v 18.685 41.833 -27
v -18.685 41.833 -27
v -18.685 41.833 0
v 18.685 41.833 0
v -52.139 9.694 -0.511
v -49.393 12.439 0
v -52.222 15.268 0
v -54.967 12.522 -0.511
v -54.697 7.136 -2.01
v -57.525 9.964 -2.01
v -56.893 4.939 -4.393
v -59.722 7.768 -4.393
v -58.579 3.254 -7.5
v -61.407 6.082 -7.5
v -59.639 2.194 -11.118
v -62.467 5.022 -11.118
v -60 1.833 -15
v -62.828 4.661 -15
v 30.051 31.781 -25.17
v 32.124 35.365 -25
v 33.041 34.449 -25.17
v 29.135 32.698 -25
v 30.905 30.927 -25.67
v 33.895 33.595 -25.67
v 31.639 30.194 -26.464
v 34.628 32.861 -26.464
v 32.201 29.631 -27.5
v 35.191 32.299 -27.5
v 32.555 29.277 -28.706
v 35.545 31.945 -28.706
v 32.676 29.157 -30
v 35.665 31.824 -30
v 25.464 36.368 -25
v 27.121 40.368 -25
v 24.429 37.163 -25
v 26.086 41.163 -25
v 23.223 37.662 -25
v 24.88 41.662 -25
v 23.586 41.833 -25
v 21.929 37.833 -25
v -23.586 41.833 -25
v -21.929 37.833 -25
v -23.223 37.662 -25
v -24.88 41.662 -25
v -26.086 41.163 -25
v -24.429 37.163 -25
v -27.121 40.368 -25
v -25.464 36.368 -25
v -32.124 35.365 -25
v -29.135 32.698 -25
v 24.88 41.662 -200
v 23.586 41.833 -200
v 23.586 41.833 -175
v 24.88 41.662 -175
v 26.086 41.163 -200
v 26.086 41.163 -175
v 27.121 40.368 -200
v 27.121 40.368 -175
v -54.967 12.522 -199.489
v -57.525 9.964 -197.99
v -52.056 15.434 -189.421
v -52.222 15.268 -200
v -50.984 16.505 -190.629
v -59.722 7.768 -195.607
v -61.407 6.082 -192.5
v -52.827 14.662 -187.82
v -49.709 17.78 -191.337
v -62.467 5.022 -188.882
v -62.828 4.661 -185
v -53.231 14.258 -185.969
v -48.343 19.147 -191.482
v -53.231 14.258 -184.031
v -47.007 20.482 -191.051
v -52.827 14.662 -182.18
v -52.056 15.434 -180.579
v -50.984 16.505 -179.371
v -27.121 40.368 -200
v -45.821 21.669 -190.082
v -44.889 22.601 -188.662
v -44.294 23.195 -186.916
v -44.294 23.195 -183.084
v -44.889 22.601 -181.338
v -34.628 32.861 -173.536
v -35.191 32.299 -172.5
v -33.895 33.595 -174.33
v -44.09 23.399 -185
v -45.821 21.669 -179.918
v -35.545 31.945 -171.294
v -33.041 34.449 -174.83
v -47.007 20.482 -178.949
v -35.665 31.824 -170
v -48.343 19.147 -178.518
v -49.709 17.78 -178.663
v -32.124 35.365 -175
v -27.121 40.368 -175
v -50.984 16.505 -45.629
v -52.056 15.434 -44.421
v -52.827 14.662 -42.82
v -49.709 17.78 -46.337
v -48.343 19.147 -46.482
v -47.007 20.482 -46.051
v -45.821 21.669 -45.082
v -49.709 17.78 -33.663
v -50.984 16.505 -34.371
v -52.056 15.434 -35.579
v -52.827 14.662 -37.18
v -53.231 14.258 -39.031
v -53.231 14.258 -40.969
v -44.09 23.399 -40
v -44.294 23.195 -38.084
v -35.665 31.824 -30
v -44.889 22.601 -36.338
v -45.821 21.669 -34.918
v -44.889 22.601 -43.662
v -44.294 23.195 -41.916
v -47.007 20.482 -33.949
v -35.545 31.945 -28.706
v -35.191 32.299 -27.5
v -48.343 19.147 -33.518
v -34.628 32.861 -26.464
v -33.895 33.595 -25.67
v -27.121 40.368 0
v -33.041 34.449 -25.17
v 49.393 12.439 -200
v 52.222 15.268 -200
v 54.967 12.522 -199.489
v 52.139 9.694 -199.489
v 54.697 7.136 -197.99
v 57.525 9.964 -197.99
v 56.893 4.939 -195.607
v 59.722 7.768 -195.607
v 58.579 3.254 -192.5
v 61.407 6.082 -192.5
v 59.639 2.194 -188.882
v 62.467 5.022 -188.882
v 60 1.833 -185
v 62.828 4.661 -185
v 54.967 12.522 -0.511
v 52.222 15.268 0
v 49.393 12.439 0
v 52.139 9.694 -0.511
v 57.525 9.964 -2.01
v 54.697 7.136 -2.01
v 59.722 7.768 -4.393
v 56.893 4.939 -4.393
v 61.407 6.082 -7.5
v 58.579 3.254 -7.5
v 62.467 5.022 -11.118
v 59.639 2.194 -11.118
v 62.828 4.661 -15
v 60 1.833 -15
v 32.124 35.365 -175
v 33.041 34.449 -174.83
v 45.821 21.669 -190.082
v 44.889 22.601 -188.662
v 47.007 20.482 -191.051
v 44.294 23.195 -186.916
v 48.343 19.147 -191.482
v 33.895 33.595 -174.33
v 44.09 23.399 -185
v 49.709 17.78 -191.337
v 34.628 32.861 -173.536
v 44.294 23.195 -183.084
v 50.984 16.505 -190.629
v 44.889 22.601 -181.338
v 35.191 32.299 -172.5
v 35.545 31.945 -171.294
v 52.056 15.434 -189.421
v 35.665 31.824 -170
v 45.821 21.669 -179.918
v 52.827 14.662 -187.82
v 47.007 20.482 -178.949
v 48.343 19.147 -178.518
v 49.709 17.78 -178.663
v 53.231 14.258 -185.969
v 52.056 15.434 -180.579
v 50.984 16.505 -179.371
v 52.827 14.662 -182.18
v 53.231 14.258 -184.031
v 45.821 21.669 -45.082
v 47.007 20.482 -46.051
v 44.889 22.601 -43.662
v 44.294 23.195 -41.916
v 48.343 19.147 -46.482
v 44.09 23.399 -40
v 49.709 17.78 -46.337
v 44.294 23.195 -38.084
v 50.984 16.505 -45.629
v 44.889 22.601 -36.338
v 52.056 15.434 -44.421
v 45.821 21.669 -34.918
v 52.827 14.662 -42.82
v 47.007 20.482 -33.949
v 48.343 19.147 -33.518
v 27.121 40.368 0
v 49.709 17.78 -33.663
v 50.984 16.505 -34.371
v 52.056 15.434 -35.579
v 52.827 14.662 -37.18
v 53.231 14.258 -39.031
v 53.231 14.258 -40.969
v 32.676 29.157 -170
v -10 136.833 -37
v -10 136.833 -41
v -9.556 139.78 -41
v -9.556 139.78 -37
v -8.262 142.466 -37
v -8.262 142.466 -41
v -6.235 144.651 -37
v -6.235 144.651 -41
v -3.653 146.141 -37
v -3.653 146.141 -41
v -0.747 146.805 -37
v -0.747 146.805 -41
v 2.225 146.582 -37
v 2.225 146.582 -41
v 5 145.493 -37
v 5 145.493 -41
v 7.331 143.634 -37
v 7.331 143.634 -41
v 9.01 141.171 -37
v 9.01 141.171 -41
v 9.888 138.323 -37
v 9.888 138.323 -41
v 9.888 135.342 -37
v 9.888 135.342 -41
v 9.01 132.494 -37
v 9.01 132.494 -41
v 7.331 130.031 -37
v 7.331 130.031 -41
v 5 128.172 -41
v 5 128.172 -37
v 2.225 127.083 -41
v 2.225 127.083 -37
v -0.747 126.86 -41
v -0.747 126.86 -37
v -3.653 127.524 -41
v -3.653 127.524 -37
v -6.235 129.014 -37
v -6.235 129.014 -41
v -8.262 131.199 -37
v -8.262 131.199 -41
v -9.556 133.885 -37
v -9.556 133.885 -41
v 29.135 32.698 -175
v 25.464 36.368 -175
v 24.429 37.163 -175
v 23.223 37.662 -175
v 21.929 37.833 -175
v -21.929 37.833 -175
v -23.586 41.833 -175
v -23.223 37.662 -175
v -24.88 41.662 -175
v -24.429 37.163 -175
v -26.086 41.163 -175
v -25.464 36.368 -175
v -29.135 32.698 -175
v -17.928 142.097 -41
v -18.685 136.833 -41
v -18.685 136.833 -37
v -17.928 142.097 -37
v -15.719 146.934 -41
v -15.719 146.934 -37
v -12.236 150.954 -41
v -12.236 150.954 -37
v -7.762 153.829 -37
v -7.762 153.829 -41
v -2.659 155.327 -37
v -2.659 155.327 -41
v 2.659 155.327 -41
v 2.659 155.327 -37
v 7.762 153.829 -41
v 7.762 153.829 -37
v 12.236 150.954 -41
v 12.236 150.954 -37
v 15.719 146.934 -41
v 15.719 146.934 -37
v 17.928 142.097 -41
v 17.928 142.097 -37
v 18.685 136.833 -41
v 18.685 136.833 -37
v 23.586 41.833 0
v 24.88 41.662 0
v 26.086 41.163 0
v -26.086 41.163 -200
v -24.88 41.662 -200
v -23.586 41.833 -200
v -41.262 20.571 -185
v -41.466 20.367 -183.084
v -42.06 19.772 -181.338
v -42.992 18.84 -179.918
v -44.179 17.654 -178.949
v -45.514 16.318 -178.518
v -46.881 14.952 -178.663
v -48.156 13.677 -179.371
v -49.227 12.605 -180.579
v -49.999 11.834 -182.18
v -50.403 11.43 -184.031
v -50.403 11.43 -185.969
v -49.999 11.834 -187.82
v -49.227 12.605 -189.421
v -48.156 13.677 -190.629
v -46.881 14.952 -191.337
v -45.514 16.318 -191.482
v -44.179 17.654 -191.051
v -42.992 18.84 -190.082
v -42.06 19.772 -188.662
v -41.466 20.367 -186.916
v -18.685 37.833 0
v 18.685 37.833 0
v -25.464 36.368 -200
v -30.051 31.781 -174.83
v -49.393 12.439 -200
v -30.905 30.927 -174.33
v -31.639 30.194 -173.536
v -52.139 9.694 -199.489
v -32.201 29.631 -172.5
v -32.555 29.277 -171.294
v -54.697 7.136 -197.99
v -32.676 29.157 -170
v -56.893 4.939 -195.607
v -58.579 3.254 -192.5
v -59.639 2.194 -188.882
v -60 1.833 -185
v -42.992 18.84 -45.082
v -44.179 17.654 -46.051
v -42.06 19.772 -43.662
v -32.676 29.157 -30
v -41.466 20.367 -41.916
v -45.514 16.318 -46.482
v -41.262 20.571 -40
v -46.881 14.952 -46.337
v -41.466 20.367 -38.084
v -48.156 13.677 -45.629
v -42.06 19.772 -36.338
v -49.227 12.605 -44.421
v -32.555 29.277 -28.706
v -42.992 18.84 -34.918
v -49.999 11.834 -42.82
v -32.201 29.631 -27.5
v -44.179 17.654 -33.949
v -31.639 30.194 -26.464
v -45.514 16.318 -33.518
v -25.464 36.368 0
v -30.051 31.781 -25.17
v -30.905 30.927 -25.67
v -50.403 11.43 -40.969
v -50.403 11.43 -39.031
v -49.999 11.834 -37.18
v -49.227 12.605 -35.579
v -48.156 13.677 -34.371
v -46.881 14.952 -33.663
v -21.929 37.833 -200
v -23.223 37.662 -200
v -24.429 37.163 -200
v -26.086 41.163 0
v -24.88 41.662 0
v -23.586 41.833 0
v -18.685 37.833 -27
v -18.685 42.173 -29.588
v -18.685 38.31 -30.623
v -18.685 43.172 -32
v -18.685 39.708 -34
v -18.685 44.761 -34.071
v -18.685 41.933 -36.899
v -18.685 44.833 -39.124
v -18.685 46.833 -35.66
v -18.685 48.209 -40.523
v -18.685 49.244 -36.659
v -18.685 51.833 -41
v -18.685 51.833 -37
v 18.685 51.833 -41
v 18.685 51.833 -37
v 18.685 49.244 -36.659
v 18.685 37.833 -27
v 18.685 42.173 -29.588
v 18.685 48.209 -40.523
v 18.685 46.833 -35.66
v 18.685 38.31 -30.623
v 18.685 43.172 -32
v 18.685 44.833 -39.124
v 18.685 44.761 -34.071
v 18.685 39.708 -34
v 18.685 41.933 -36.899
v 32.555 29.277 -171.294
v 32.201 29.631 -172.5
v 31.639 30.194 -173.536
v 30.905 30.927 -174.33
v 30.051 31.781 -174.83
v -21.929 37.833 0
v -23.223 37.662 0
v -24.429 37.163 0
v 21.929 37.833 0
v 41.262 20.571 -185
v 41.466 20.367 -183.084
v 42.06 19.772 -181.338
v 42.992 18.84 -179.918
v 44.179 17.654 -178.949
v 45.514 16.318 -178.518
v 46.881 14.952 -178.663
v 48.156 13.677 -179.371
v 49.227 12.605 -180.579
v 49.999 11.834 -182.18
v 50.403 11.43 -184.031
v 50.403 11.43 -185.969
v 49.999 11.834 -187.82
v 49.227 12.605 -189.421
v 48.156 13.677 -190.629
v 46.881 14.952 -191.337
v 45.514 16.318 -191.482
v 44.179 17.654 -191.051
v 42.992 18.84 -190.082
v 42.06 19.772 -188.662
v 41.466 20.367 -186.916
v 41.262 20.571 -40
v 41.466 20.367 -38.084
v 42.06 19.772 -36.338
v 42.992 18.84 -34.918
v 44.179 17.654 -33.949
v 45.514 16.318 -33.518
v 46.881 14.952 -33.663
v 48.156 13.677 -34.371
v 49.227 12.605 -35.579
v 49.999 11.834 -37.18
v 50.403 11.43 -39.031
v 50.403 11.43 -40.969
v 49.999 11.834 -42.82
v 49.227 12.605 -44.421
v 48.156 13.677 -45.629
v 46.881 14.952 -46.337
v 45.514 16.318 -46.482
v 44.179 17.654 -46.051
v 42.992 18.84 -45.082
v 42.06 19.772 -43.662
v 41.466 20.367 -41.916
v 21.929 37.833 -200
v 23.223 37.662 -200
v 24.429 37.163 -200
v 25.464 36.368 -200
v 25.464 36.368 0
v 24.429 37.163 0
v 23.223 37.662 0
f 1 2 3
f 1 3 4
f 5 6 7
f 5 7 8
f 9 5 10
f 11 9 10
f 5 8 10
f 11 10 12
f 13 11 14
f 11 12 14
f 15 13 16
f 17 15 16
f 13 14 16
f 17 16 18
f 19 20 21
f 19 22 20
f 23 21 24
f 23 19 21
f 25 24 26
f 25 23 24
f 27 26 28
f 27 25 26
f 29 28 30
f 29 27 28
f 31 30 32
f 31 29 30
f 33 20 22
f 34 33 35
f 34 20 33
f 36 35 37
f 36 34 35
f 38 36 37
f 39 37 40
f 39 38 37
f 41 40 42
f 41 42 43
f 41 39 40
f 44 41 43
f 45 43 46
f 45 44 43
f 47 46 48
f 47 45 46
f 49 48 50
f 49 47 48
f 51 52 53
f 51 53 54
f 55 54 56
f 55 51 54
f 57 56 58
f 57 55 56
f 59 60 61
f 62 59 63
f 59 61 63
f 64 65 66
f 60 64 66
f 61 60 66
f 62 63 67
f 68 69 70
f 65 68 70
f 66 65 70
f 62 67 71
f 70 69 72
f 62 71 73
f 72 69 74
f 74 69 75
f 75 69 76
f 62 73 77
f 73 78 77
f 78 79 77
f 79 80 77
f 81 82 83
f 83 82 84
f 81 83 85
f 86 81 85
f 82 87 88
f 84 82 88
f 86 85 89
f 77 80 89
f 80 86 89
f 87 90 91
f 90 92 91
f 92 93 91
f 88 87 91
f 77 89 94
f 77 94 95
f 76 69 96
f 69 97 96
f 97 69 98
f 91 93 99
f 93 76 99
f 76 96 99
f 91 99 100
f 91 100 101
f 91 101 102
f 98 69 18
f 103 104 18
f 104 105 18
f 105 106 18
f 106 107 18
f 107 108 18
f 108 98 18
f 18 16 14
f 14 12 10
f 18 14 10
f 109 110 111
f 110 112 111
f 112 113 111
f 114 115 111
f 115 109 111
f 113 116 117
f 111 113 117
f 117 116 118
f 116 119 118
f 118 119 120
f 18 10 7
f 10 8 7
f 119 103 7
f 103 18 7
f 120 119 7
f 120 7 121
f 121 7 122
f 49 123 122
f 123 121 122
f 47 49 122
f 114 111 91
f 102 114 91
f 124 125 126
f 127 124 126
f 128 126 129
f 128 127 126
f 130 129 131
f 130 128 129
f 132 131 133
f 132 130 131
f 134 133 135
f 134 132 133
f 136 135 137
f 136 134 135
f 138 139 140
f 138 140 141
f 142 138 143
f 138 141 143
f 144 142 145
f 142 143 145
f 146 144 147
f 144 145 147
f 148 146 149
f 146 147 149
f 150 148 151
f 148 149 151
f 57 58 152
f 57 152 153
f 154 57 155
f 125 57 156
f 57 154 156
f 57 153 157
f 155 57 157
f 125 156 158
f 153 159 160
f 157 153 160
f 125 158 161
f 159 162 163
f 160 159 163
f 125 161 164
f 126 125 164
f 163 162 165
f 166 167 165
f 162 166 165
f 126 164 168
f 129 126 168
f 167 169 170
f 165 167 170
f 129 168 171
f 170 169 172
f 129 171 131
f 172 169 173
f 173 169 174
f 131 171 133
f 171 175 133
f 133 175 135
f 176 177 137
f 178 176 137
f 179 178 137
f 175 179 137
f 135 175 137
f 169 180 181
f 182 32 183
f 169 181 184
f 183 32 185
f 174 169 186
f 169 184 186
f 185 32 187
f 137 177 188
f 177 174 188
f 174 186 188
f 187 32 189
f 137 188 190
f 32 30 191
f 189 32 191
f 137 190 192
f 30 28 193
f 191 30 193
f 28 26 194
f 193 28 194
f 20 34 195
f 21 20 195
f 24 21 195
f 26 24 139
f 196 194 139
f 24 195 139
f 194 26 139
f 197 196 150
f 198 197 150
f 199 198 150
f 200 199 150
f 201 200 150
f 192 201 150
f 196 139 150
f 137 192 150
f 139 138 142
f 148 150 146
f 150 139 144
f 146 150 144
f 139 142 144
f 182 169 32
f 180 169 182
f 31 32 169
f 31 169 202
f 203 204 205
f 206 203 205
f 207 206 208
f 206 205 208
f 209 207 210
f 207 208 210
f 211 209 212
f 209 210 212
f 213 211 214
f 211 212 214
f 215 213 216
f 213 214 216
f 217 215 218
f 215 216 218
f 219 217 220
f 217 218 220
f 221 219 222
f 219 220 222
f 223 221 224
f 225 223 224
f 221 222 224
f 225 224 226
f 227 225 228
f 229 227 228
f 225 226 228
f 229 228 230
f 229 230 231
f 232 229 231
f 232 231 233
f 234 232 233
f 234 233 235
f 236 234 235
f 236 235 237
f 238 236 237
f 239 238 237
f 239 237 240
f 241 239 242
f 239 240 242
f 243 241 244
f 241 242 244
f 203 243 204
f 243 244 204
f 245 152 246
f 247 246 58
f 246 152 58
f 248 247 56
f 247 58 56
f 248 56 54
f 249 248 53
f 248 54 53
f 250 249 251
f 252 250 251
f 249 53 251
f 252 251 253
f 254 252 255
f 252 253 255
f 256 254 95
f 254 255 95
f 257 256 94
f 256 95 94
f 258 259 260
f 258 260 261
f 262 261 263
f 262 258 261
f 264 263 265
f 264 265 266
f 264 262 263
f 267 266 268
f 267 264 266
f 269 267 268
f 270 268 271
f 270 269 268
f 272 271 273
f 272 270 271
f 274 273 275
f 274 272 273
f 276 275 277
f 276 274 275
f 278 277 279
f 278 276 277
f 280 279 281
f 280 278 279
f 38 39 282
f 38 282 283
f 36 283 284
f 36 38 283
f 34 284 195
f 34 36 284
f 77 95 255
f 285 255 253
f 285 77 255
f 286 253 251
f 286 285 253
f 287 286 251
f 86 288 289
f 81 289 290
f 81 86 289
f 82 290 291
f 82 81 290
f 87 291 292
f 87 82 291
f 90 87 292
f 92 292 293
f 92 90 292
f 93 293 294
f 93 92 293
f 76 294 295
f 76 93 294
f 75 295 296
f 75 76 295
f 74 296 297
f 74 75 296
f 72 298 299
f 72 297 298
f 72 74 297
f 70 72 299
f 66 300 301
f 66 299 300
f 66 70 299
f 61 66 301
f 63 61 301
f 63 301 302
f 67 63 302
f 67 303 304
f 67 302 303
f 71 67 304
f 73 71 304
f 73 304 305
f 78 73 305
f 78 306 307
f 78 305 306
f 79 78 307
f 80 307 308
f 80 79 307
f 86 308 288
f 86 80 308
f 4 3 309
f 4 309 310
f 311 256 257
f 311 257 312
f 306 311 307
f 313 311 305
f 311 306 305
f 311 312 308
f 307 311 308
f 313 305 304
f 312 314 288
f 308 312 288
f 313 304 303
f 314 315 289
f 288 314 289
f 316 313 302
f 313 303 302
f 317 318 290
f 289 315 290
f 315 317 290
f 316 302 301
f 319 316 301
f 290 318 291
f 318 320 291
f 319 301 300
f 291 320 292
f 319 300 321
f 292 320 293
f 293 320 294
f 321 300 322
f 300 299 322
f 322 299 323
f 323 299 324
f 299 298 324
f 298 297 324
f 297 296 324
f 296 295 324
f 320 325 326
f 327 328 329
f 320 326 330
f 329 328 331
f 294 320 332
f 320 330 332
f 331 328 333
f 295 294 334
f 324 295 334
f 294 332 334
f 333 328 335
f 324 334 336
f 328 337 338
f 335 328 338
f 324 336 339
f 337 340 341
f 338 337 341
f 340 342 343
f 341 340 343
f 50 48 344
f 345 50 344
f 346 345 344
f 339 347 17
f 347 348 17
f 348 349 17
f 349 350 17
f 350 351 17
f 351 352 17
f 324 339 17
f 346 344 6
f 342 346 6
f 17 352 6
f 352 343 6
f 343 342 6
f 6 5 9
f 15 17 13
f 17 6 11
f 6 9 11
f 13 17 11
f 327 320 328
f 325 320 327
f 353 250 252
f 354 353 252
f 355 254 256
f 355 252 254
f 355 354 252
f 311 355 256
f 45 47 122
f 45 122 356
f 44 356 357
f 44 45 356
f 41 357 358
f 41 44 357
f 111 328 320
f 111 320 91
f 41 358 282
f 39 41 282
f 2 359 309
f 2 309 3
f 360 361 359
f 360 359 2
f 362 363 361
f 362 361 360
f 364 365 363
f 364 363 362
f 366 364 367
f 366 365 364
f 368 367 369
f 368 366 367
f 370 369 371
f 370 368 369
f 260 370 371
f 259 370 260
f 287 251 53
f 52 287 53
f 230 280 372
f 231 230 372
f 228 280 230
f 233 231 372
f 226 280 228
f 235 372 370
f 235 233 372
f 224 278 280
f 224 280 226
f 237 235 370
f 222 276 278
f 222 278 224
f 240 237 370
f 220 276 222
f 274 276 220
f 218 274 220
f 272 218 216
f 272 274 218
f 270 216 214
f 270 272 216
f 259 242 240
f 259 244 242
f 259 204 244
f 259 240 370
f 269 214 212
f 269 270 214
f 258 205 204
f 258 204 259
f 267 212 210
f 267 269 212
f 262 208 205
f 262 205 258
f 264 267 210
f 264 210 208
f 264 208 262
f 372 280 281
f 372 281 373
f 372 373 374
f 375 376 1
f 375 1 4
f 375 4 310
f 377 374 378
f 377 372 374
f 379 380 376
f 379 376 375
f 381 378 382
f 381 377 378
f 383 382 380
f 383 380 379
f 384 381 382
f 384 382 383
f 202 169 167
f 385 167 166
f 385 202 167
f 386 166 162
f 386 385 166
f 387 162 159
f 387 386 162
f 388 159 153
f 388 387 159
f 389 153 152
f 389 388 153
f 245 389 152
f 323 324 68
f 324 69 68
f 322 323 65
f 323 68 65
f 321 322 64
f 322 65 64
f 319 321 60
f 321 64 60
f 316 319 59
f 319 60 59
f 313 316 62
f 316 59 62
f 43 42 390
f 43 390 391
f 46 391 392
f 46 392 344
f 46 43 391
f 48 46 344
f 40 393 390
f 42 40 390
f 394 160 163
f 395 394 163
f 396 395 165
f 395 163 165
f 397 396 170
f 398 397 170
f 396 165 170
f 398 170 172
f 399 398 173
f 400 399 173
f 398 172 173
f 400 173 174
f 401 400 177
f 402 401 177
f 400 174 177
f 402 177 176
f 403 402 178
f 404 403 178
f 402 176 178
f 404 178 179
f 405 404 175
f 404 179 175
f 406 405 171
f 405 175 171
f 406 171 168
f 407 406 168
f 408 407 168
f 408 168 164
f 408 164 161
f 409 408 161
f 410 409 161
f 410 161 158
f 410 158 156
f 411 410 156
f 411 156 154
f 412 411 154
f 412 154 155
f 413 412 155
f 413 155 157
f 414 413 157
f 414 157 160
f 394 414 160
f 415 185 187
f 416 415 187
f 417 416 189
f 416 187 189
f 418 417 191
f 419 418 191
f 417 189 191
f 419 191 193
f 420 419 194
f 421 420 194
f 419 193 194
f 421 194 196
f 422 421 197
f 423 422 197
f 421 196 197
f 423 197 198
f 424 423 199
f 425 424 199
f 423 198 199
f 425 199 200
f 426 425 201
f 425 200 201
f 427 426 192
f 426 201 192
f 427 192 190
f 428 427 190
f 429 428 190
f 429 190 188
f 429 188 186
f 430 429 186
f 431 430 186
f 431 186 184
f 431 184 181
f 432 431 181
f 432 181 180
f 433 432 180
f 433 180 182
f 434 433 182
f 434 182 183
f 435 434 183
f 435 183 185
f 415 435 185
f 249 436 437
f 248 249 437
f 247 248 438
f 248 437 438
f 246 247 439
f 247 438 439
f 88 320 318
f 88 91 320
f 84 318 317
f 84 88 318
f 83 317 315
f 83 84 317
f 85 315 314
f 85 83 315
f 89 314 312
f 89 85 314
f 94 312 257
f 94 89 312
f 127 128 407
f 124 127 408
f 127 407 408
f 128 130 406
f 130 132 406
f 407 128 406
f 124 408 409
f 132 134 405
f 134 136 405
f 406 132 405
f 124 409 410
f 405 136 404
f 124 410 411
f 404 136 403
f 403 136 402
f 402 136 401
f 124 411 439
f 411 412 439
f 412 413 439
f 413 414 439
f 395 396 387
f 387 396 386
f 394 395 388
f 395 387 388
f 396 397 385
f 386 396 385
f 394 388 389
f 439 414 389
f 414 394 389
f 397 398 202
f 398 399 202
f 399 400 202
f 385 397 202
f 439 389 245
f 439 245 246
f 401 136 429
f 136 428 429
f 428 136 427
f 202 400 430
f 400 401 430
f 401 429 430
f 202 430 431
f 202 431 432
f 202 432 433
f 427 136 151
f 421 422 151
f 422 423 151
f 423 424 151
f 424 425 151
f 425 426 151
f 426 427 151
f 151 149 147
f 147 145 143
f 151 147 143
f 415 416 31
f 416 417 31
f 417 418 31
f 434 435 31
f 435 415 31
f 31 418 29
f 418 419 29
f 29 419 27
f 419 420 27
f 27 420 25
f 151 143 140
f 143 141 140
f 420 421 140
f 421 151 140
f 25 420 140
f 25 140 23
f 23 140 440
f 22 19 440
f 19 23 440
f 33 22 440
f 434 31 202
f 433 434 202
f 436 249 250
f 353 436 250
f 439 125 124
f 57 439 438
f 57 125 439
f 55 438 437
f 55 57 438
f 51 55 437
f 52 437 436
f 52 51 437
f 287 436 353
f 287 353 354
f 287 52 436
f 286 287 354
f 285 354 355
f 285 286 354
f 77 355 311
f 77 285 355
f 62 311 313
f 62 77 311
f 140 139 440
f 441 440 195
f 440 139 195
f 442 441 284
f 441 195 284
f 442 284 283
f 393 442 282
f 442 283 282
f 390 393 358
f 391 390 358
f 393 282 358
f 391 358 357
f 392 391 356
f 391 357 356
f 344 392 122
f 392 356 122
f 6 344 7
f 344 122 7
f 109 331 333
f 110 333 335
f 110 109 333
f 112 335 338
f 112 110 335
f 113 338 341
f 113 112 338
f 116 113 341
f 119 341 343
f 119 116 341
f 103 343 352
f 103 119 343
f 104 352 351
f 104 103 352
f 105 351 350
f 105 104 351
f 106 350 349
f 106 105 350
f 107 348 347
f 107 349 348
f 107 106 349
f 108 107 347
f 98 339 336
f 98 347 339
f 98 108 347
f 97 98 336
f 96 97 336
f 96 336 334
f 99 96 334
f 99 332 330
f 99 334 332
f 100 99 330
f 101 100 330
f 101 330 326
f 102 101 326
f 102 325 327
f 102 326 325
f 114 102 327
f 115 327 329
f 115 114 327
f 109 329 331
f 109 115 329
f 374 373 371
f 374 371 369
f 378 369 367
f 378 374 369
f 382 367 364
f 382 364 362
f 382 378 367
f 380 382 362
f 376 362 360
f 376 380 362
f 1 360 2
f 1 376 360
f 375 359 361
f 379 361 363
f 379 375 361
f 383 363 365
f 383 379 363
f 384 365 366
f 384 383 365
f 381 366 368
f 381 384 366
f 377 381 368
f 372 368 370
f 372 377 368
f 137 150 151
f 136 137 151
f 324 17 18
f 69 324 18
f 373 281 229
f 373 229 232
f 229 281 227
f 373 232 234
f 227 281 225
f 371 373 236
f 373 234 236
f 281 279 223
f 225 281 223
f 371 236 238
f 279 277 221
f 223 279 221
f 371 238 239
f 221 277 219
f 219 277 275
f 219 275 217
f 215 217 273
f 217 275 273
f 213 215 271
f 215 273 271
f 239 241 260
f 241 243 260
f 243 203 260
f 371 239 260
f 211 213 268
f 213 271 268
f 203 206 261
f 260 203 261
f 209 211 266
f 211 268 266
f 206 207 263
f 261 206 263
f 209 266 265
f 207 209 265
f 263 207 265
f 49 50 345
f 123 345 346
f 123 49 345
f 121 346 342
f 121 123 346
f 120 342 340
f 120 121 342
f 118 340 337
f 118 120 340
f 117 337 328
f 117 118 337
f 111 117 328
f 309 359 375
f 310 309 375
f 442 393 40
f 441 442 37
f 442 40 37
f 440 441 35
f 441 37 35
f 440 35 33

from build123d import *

# Parameters (mm, degrees)
BOSS_EXTRUDE1_DEPTH          = 200
FILLET3_R                    = 5
CUT_EXTRUDE1_DEPTH           = 150
SKETCH5_W                    = 37.37
SKETCH5_H                    = 41
BASE_FLANGE1_DEPTH           = 4
EDGE_FLANGE1_STRIP_W         = 36
EDGE_FLANGE1_STRIP_H         = 4
EDGE_FLANGE1_STRIP_CUT_DEPTH = 37.37
EDGE_FLANGE1_DEPTH           = 37.37
EDGE_FLANGE1_PROFILE_R       = 10
EDGE_FLANGE1_FLAT_DEPTH      = 4
SKETCH21_R                   = 6.5
CUT_EXTRUDE3_DEPTH           = 254.288349545
FILLET4_R                    = 5
FILLET5_R                    = 15


# Sheet-metal steps are written as plain solids
with BuildPart() as part:
    # Sketch1 → Boss-Extrude1 (new body)
    with BuildSketch(Plane.XY):
        Polygon((24, 37.832514472), (-24, 37.832514472), (-60, 1.832514472), (-62.828427125, 4.660941596), (-25.656854249, 41.832514472), (25.656854249, 41.832514472), (62.828427125, 4.660941596), (60, 1.832514472), align=None)
    extrude(amount=-BOSS_EXTRUDE1_DEPTH)

    # Fillet3
    fillet3_edges = [part.edges().sort_by_distance(p)[0] for p in [
        (-25.656854249, 41.832514472, -100),
        (25.656854249, 41.832514472, -100),
        (24, 37.832514472, -100),
        (-24, 37.832514472, -100),
    ]]
    fillet(fillet3_edges, radius=FILLET3_R)

    # Sketch4 → Cut-Extrude1 (cut)
    with BuildSketch(Plane.XY.offset(-25)):
        Polygon((0, 0), (-80.502525317, 71.832514472), (80.502525317, 71.832514472), align=None)
    extrude(amount=-CUT_EXTRUDE1_DEPTH, mode=Mode.SUBTRACT)

    # Sketch21 → Cut-Extrude3 (cut, through all)
    with BuildSketch(Plane(origin=(33.744684361, 33.744684361, 0), x_dir=(0, 0, -1), z_dir=(0.7071067811865477, 0.7071067811865475, 0))):
        with Locations(Location((185, -21.130623462, 0), (0, 0, 90))):
            Circle(SKETCH21_R)
        with Locations(Location((40, -21.130623462, 0), (0, 0, 90))):
            Circle(SKETCH21_R)
    cut_extrude3 = extrude(amount=-CUT_EXTRUDE3_DEPTH, mode=Mode.SUBTRACT)

    # Mirror1: Cut-Extrude3 across plane
    add(cut_extrude3.mirror(Plane(origin=(0, 0, 0), x_dir=(0, 0, 1), z_dir=(1, 0, 0))), mode=Mode.SUBTRACT)

    # Fillet4
    fillet4_edges = [part.edges().sort_by_distance(p)[0] for p in [
        (34.170530267, 30.490411329, -25),
        (-34.170530267, 30.490411329, -25),
        (-34.170530267, 30.490411329, -175),
        (34.170530267, 30.490411329, -175),
    ]]
    fillet(fillet4_edges, radius=FILLET4_R)

    # Fillet5
    fillet5_edges = [part.edges().sort_by_distance(p)[0] for p in [
        (61.414213562, 3.246728034, 0),
        (61.414213562, 3.246728034, -200),
        (-61.414213562, 3.246728034, -200),
        (-61.414213562, 3.246728034, 0),
    ]]
    fillet(fillet5_edges, radius=FILLET5_R)


with BuildPart() as body_2:
    # Sketch5 → Base-Flange1 (new body)
    with BuildSketch(Plane(origin=(0, 41.832514472, 0), x_dir=(1, 0, 0), z_dir=(0, 1, 0))):
        with Locations((0, 20.5)):
            Rectangle(SKETCH5_W, SKETCH5_H)
    extrude(amount=-BASE_FLANGE1_DEPTH)

    # Edge-Flange1 strip (across the edge) → Edge-Flange1 strip cut (cut)
    with BuildSketch(Plane(origin=(18.685, 41.832514472, -41), x_dir=(0, 0, 1), z_dir=(-1, 0, 0))):
        with Locations((-4, -2)):
            Rectangle(EDGE_FLANGE1_STRIP_W, EDGE_FLANGE1_STRIP_H)
    extrude(amount=EDGE_FLANGE1_STRIP_CUT_DEPTH, mode=Mode.SUBTRACT)

    # Edge-Flange1 bend section (across the edge) → Edge-Flange1 (add)
    with BuildSketch(Plane(origin=(18.685, 41.832514472, -41), x_dir=(0, 0, 1), z_dir=(-1, 0, 0))):
        with BuildLine():
            Line((0, 10), (4, 10))
            ThreePointArc((4, 10), (6.928932188, 2.928932188), (14, 0))
            Line((14, 0), (14, -4))
            ThreePointArc((14, -4), (4.100505063, 0.100505063), (0, 10))
        make_face()
    extrude(amount=EDGE_FLANGE1_DEPTH)

    # Edge-Flange1 profile (on flange) → Edge-Flange1 flat (add)
    with BuildSketch(Plane(origin=(0, 41.832514472, -41), x_dir=(-1, 0, 0), z_dir=(0, 0, -1))):
        with BuildLine():
            ThreePointArc((18.685, 95), (0, 113.685), (-18.685, 95))
            Line((-18.685, 95), (-18.685, 10))
            Line((-18.685, 10), (18.685, 10))
            Line((18.685, 10), (18.685, 95))
        make_face()
        with Locations((0, 95)):
            Circle(EDGE_FLANGE1_PROFILE_R, mode=Mode.SUBTRACT)
    extrude(amount=-EDGE_FLANGE1_FLAT_DEPTH)


solid = Compound([part.part, body_2.part])
